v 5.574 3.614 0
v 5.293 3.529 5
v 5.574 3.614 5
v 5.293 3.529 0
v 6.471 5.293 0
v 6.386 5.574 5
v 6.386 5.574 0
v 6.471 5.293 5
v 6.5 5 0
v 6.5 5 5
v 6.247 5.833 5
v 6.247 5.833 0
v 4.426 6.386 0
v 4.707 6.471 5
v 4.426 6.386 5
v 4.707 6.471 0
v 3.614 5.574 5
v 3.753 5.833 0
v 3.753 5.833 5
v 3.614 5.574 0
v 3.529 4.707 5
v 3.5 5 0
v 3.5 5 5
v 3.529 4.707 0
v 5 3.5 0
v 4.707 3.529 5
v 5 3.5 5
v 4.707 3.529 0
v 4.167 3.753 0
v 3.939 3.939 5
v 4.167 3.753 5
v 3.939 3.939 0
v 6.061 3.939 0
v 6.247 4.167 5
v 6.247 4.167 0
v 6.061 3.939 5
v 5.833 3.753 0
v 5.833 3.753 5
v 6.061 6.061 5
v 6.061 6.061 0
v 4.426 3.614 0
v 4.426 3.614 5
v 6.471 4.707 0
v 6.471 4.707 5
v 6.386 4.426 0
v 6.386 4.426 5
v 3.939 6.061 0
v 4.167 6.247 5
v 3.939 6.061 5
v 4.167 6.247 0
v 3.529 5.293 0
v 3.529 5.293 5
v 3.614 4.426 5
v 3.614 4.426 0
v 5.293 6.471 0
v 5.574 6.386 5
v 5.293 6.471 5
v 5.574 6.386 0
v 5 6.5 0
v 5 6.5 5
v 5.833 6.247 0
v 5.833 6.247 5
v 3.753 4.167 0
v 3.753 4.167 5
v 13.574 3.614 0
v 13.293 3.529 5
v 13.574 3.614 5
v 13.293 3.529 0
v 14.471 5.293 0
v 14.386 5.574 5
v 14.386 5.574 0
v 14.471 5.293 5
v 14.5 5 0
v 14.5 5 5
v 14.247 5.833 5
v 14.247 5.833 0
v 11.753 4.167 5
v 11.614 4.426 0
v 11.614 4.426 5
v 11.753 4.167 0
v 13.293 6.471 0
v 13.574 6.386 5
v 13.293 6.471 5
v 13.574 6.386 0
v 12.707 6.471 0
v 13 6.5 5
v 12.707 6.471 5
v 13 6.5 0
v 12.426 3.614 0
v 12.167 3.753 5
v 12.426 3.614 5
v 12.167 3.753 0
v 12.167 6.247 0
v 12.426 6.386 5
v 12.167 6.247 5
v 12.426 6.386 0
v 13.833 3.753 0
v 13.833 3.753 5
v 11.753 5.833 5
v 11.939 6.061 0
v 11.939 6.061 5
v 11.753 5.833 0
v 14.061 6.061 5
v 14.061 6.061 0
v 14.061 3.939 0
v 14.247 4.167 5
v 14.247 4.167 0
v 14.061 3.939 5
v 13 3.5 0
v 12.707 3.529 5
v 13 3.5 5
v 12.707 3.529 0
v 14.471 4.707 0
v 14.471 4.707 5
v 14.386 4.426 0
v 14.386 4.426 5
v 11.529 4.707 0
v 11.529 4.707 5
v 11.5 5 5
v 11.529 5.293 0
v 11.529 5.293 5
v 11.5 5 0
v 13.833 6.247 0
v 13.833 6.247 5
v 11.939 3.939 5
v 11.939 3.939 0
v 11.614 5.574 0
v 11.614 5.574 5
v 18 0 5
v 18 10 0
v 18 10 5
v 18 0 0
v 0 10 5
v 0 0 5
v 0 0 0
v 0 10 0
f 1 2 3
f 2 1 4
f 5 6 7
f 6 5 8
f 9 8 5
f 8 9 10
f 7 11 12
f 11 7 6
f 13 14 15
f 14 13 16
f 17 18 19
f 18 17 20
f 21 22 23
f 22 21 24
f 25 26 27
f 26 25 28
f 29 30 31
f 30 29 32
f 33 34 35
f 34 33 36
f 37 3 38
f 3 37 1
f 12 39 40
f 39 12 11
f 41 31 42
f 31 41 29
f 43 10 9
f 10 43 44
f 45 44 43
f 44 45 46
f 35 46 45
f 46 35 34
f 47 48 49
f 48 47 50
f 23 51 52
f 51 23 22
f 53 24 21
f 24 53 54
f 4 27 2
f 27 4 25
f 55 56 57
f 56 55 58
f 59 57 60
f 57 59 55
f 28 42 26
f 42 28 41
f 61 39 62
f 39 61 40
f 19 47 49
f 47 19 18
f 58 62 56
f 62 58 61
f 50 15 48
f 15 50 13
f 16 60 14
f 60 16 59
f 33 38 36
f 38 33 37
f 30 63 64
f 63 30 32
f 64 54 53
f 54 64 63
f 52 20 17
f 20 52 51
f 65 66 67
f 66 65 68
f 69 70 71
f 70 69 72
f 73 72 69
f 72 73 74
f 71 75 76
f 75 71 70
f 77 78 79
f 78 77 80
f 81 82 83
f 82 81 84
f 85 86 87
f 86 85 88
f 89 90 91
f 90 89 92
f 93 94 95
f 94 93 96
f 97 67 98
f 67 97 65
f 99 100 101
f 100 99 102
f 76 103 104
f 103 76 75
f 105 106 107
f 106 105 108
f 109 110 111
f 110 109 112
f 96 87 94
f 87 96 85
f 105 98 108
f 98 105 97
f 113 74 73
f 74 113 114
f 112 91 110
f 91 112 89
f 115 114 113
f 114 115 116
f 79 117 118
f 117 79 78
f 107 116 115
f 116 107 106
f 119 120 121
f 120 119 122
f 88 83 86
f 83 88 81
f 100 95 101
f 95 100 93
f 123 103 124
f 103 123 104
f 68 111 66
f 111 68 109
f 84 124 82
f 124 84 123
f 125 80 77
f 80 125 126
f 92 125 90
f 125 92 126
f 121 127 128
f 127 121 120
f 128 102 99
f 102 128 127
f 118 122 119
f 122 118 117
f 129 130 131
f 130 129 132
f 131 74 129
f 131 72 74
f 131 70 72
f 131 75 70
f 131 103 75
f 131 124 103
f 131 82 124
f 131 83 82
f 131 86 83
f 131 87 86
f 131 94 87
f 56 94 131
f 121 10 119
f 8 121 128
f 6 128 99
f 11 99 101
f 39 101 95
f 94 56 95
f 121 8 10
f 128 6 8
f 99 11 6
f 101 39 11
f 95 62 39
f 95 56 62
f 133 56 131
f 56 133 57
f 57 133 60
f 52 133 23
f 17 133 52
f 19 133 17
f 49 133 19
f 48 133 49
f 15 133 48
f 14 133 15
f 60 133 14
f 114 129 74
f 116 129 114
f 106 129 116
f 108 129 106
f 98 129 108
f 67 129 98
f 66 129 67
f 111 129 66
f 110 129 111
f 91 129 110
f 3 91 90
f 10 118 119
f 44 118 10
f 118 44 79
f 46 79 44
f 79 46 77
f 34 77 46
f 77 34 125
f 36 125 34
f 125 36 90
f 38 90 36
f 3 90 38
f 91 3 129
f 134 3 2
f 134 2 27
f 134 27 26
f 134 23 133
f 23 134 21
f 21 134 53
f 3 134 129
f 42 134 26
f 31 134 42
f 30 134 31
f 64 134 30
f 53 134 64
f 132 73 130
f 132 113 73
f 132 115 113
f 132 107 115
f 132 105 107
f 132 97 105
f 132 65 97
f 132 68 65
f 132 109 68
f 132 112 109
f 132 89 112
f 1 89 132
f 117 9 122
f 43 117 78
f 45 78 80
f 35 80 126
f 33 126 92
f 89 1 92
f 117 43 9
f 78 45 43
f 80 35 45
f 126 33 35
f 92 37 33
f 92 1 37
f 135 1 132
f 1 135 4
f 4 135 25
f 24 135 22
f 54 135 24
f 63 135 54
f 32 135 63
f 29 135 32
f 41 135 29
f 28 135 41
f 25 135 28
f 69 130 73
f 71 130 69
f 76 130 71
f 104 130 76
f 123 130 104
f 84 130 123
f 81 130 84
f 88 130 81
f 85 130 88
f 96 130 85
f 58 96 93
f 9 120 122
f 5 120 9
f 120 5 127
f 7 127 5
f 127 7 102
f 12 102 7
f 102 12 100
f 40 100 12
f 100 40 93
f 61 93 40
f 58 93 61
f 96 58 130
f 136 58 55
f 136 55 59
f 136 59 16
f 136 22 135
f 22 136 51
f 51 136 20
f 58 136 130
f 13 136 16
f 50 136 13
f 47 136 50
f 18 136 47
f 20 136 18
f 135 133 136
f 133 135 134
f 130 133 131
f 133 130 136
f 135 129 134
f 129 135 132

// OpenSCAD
$fn = 32;

// ----------------------------------------------------------------------
// Micro pad: two-hole pad, 5-20 mm class
// ----------------------------------------------------------------------

// --- parameters (mm) ---
pad_l = 18;               // pad length, X
pad_w = 10;               // pad width, Y
pad_t = 5;                // pad thickness, Z
hole_d = 3;               // hole diameter
hole_x = 5;               // X of the first hole centre

difference() {
  cube([pad_l, pad_w, pad_t]);
  for (x = [hole_x, pad_l - hole_x])
    translate([x, pad_w / 2, -1])
      cylinder(h = pad_t + 2, d = hole_d);
}
